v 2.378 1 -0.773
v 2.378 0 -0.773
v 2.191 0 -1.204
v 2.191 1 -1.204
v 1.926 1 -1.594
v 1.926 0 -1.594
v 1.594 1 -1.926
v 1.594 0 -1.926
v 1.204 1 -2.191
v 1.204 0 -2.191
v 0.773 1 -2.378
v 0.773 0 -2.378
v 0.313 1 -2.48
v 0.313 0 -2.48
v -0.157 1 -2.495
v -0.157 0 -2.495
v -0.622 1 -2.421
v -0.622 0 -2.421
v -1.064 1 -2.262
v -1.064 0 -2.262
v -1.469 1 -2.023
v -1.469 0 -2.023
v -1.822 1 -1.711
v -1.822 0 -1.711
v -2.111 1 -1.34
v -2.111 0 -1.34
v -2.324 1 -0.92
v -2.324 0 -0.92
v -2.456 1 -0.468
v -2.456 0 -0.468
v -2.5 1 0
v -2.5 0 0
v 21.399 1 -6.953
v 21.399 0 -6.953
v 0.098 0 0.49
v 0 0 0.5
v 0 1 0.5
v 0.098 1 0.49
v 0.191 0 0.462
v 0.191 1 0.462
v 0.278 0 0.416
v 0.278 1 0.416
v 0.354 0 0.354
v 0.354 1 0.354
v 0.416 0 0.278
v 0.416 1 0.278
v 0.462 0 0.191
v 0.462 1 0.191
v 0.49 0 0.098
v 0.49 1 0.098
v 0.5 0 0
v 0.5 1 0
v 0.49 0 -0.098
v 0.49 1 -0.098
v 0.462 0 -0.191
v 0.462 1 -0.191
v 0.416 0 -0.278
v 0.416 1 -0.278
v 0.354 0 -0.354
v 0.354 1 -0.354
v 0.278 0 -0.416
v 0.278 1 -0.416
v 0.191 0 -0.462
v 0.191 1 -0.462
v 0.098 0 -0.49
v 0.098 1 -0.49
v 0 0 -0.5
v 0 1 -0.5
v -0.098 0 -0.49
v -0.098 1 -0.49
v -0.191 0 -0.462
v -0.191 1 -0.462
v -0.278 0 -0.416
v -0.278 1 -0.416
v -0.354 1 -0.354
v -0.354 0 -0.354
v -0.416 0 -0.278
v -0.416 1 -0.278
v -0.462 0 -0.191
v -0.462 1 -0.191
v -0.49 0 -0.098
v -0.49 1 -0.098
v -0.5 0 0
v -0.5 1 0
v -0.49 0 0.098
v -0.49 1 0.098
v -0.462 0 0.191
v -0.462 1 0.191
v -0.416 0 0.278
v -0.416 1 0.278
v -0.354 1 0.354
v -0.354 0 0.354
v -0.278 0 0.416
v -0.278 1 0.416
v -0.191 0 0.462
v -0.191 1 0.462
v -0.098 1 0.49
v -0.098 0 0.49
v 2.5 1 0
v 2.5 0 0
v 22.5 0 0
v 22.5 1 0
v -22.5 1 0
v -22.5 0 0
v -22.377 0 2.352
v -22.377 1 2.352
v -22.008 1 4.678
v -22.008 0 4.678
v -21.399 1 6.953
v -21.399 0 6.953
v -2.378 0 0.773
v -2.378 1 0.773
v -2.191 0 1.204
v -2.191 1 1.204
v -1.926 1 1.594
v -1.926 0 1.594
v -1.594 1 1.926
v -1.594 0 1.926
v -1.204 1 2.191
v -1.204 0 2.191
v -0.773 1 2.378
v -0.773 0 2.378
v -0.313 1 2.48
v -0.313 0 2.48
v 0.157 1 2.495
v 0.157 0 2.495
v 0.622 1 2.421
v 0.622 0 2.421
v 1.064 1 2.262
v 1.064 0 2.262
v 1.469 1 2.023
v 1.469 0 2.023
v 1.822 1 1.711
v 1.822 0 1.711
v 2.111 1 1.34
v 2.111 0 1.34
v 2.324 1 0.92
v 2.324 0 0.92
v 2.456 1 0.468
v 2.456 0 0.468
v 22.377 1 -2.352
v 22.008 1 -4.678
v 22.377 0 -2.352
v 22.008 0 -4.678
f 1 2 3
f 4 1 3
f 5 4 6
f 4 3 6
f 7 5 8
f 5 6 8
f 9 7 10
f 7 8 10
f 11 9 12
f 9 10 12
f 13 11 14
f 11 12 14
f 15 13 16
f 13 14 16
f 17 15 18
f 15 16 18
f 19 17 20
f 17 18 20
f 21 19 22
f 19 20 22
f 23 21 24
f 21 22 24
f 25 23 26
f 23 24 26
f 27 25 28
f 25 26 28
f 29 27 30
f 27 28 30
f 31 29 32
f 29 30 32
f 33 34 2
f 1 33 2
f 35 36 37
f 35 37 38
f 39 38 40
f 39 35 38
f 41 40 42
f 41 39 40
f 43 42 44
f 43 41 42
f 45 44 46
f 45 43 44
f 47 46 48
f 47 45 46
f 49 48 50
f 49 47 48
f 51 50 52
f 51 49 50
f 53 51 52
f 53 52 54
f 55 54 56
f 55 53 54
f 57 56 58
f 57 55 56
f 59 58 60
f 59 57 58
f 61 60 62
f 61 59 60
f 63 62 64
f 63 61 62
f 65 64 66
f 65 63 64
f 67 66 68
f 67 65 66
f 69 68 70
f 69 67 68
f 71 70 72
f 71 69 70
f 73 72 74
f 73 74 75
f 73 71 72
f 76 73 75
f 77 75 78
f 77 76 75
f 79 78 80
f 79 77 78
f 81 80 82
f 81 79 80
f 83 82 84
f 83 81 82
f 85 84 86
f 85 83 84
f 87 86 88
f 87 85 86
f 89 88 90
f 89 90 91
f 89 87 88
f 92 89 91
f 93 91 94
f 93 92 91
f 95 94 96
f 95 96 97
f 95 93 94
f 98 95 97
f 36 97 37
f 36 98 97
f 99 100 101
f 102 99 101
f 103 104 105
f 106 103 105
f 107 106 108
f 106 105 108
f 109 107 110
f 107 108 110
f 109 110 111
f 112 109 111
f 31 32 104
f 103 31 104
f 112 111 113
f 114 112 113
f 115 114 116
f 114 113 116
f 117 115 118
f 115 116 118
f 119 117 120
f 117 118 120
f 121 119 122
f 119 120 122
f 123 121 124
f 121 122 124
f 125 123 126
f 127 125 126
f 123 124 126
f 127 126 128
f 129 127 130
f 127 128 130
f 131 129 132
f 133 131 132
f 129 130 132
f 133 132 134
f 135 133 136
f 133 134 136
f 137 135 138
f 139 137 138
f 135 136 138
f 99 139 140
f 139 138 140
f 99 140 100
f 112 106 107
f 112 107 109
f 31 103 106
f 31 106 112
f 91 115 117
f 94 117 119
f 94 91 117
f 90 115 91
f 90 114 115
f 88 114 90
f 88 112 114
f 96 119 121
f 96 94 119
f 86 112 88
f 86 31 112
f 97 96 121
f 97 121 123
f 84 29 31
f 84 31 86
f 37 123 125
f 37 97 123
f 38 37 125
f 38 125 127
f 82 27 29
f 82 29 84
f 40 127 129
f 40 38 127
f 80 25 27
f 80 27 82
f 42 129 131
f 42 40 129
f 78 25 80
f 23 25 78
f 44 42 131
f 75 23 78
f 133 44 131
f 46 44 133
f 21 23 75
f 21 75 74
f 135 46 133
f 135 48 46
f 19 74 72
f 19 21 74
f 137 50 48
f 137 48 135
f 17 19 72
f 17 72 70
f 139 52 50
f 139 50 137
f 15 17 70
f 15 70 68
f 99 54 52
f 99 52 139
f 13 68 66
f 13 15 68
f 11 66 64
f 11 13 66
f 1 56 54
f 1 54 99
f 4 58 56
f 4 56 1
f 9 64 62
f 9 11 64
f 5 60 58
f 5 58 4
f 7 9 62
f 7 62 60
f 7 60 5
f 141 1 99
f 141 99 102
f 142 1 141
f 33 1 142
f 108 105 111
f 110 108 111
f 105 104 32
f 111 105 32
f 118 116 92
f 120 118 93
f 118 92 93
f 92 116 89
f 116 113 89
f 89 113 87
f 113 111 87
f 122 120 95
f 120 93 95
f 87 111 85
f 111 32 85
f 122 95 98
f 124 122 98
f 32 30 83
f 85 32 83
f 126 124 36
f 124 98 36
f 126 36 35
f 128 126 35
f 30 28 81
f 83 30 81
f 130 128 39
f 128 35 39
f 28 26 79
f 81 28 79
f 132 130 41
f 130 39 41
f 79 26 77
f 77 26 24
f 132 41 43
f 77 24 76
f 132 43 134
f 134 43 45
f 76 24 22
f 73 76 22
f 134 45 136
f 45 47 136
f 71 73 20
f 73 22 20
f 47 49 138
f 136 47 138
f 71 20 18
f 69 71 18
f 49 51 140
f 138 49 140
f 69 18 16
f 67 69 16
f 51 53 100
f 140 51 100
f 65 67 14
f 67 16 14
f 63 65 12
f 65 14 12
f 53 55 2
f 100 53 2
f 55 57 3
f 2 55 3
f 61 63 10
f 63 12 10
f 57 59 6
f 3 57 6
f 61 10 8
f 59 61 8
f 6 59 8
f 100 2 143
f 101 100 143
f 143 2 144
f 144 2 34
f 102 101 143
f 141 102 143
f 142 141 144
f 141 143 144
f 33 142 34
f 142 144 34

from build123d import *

# Parameters (mm, degrees)
SKETCH_1_R      = 2.5
SKETCH_1_R_2    = 0.5
EXTRUDE_1_DEPTH = 1


with BuildPart() as part:
    # 草图1 → 凸台-拉伸1 (new body)
    # profile 1 of 3: a face of its own
    with BuildSketch(Plane(origin=(0, 0, 0), x_dir=(1, 0, 0), z_dir=(0, 1, 0))):
        with BuildLine():
            Line((-21.398771617, -6.952882373), (-2.377641291, -0.772542486))
            ThreePointArc((-2.377641291, -0.772542486), (-2.469220851, -0.391086163), (-2.5, 0))
            Line((-2.5, 0), (-22.5, 0))
            ThreePointArc((-22.5, 0), (-22.222987663, -3.519775463), (-21.398771617, -6.952882373))
        make_face()
    # profile 2 of 3: a face of its own
    with BuildSketch(Plane(origin=(0, 0, 0), x_dir=(1, 0, 0), z_dir=(0, 1, 0))):
        with BuildLine():
            ThreePointArc((2.377641291, 0.772542486), (2.469220851, 0.391086163), (2.5, 0))
            Line((2.5, 0), (22.5, 0))
            ThreePointArc((22.5, 0), (22.222987663, 3.519775463), (21.398771617, 6.952882373))
            Line((21.398771617, 6.952882373), (2.377641291, 0.772542486))
        make_face()
    # profile 3 of 3: a face of its own
    with BuildSketch(Plane(origin=(0, 0, 0), x_dir=(1, 0, 0), z_dir=(0, 1, 0))):
        Circle(SKETCH_1_R)
        with Locations(Location((0, 0, 0), (0, 0, 270))):
            Circle(SKETCH_1_R_2, mode=Mode.SUBTRACT)
    extrude(amount=EXTRUDE_1_DEPTH)


solid = part.part
